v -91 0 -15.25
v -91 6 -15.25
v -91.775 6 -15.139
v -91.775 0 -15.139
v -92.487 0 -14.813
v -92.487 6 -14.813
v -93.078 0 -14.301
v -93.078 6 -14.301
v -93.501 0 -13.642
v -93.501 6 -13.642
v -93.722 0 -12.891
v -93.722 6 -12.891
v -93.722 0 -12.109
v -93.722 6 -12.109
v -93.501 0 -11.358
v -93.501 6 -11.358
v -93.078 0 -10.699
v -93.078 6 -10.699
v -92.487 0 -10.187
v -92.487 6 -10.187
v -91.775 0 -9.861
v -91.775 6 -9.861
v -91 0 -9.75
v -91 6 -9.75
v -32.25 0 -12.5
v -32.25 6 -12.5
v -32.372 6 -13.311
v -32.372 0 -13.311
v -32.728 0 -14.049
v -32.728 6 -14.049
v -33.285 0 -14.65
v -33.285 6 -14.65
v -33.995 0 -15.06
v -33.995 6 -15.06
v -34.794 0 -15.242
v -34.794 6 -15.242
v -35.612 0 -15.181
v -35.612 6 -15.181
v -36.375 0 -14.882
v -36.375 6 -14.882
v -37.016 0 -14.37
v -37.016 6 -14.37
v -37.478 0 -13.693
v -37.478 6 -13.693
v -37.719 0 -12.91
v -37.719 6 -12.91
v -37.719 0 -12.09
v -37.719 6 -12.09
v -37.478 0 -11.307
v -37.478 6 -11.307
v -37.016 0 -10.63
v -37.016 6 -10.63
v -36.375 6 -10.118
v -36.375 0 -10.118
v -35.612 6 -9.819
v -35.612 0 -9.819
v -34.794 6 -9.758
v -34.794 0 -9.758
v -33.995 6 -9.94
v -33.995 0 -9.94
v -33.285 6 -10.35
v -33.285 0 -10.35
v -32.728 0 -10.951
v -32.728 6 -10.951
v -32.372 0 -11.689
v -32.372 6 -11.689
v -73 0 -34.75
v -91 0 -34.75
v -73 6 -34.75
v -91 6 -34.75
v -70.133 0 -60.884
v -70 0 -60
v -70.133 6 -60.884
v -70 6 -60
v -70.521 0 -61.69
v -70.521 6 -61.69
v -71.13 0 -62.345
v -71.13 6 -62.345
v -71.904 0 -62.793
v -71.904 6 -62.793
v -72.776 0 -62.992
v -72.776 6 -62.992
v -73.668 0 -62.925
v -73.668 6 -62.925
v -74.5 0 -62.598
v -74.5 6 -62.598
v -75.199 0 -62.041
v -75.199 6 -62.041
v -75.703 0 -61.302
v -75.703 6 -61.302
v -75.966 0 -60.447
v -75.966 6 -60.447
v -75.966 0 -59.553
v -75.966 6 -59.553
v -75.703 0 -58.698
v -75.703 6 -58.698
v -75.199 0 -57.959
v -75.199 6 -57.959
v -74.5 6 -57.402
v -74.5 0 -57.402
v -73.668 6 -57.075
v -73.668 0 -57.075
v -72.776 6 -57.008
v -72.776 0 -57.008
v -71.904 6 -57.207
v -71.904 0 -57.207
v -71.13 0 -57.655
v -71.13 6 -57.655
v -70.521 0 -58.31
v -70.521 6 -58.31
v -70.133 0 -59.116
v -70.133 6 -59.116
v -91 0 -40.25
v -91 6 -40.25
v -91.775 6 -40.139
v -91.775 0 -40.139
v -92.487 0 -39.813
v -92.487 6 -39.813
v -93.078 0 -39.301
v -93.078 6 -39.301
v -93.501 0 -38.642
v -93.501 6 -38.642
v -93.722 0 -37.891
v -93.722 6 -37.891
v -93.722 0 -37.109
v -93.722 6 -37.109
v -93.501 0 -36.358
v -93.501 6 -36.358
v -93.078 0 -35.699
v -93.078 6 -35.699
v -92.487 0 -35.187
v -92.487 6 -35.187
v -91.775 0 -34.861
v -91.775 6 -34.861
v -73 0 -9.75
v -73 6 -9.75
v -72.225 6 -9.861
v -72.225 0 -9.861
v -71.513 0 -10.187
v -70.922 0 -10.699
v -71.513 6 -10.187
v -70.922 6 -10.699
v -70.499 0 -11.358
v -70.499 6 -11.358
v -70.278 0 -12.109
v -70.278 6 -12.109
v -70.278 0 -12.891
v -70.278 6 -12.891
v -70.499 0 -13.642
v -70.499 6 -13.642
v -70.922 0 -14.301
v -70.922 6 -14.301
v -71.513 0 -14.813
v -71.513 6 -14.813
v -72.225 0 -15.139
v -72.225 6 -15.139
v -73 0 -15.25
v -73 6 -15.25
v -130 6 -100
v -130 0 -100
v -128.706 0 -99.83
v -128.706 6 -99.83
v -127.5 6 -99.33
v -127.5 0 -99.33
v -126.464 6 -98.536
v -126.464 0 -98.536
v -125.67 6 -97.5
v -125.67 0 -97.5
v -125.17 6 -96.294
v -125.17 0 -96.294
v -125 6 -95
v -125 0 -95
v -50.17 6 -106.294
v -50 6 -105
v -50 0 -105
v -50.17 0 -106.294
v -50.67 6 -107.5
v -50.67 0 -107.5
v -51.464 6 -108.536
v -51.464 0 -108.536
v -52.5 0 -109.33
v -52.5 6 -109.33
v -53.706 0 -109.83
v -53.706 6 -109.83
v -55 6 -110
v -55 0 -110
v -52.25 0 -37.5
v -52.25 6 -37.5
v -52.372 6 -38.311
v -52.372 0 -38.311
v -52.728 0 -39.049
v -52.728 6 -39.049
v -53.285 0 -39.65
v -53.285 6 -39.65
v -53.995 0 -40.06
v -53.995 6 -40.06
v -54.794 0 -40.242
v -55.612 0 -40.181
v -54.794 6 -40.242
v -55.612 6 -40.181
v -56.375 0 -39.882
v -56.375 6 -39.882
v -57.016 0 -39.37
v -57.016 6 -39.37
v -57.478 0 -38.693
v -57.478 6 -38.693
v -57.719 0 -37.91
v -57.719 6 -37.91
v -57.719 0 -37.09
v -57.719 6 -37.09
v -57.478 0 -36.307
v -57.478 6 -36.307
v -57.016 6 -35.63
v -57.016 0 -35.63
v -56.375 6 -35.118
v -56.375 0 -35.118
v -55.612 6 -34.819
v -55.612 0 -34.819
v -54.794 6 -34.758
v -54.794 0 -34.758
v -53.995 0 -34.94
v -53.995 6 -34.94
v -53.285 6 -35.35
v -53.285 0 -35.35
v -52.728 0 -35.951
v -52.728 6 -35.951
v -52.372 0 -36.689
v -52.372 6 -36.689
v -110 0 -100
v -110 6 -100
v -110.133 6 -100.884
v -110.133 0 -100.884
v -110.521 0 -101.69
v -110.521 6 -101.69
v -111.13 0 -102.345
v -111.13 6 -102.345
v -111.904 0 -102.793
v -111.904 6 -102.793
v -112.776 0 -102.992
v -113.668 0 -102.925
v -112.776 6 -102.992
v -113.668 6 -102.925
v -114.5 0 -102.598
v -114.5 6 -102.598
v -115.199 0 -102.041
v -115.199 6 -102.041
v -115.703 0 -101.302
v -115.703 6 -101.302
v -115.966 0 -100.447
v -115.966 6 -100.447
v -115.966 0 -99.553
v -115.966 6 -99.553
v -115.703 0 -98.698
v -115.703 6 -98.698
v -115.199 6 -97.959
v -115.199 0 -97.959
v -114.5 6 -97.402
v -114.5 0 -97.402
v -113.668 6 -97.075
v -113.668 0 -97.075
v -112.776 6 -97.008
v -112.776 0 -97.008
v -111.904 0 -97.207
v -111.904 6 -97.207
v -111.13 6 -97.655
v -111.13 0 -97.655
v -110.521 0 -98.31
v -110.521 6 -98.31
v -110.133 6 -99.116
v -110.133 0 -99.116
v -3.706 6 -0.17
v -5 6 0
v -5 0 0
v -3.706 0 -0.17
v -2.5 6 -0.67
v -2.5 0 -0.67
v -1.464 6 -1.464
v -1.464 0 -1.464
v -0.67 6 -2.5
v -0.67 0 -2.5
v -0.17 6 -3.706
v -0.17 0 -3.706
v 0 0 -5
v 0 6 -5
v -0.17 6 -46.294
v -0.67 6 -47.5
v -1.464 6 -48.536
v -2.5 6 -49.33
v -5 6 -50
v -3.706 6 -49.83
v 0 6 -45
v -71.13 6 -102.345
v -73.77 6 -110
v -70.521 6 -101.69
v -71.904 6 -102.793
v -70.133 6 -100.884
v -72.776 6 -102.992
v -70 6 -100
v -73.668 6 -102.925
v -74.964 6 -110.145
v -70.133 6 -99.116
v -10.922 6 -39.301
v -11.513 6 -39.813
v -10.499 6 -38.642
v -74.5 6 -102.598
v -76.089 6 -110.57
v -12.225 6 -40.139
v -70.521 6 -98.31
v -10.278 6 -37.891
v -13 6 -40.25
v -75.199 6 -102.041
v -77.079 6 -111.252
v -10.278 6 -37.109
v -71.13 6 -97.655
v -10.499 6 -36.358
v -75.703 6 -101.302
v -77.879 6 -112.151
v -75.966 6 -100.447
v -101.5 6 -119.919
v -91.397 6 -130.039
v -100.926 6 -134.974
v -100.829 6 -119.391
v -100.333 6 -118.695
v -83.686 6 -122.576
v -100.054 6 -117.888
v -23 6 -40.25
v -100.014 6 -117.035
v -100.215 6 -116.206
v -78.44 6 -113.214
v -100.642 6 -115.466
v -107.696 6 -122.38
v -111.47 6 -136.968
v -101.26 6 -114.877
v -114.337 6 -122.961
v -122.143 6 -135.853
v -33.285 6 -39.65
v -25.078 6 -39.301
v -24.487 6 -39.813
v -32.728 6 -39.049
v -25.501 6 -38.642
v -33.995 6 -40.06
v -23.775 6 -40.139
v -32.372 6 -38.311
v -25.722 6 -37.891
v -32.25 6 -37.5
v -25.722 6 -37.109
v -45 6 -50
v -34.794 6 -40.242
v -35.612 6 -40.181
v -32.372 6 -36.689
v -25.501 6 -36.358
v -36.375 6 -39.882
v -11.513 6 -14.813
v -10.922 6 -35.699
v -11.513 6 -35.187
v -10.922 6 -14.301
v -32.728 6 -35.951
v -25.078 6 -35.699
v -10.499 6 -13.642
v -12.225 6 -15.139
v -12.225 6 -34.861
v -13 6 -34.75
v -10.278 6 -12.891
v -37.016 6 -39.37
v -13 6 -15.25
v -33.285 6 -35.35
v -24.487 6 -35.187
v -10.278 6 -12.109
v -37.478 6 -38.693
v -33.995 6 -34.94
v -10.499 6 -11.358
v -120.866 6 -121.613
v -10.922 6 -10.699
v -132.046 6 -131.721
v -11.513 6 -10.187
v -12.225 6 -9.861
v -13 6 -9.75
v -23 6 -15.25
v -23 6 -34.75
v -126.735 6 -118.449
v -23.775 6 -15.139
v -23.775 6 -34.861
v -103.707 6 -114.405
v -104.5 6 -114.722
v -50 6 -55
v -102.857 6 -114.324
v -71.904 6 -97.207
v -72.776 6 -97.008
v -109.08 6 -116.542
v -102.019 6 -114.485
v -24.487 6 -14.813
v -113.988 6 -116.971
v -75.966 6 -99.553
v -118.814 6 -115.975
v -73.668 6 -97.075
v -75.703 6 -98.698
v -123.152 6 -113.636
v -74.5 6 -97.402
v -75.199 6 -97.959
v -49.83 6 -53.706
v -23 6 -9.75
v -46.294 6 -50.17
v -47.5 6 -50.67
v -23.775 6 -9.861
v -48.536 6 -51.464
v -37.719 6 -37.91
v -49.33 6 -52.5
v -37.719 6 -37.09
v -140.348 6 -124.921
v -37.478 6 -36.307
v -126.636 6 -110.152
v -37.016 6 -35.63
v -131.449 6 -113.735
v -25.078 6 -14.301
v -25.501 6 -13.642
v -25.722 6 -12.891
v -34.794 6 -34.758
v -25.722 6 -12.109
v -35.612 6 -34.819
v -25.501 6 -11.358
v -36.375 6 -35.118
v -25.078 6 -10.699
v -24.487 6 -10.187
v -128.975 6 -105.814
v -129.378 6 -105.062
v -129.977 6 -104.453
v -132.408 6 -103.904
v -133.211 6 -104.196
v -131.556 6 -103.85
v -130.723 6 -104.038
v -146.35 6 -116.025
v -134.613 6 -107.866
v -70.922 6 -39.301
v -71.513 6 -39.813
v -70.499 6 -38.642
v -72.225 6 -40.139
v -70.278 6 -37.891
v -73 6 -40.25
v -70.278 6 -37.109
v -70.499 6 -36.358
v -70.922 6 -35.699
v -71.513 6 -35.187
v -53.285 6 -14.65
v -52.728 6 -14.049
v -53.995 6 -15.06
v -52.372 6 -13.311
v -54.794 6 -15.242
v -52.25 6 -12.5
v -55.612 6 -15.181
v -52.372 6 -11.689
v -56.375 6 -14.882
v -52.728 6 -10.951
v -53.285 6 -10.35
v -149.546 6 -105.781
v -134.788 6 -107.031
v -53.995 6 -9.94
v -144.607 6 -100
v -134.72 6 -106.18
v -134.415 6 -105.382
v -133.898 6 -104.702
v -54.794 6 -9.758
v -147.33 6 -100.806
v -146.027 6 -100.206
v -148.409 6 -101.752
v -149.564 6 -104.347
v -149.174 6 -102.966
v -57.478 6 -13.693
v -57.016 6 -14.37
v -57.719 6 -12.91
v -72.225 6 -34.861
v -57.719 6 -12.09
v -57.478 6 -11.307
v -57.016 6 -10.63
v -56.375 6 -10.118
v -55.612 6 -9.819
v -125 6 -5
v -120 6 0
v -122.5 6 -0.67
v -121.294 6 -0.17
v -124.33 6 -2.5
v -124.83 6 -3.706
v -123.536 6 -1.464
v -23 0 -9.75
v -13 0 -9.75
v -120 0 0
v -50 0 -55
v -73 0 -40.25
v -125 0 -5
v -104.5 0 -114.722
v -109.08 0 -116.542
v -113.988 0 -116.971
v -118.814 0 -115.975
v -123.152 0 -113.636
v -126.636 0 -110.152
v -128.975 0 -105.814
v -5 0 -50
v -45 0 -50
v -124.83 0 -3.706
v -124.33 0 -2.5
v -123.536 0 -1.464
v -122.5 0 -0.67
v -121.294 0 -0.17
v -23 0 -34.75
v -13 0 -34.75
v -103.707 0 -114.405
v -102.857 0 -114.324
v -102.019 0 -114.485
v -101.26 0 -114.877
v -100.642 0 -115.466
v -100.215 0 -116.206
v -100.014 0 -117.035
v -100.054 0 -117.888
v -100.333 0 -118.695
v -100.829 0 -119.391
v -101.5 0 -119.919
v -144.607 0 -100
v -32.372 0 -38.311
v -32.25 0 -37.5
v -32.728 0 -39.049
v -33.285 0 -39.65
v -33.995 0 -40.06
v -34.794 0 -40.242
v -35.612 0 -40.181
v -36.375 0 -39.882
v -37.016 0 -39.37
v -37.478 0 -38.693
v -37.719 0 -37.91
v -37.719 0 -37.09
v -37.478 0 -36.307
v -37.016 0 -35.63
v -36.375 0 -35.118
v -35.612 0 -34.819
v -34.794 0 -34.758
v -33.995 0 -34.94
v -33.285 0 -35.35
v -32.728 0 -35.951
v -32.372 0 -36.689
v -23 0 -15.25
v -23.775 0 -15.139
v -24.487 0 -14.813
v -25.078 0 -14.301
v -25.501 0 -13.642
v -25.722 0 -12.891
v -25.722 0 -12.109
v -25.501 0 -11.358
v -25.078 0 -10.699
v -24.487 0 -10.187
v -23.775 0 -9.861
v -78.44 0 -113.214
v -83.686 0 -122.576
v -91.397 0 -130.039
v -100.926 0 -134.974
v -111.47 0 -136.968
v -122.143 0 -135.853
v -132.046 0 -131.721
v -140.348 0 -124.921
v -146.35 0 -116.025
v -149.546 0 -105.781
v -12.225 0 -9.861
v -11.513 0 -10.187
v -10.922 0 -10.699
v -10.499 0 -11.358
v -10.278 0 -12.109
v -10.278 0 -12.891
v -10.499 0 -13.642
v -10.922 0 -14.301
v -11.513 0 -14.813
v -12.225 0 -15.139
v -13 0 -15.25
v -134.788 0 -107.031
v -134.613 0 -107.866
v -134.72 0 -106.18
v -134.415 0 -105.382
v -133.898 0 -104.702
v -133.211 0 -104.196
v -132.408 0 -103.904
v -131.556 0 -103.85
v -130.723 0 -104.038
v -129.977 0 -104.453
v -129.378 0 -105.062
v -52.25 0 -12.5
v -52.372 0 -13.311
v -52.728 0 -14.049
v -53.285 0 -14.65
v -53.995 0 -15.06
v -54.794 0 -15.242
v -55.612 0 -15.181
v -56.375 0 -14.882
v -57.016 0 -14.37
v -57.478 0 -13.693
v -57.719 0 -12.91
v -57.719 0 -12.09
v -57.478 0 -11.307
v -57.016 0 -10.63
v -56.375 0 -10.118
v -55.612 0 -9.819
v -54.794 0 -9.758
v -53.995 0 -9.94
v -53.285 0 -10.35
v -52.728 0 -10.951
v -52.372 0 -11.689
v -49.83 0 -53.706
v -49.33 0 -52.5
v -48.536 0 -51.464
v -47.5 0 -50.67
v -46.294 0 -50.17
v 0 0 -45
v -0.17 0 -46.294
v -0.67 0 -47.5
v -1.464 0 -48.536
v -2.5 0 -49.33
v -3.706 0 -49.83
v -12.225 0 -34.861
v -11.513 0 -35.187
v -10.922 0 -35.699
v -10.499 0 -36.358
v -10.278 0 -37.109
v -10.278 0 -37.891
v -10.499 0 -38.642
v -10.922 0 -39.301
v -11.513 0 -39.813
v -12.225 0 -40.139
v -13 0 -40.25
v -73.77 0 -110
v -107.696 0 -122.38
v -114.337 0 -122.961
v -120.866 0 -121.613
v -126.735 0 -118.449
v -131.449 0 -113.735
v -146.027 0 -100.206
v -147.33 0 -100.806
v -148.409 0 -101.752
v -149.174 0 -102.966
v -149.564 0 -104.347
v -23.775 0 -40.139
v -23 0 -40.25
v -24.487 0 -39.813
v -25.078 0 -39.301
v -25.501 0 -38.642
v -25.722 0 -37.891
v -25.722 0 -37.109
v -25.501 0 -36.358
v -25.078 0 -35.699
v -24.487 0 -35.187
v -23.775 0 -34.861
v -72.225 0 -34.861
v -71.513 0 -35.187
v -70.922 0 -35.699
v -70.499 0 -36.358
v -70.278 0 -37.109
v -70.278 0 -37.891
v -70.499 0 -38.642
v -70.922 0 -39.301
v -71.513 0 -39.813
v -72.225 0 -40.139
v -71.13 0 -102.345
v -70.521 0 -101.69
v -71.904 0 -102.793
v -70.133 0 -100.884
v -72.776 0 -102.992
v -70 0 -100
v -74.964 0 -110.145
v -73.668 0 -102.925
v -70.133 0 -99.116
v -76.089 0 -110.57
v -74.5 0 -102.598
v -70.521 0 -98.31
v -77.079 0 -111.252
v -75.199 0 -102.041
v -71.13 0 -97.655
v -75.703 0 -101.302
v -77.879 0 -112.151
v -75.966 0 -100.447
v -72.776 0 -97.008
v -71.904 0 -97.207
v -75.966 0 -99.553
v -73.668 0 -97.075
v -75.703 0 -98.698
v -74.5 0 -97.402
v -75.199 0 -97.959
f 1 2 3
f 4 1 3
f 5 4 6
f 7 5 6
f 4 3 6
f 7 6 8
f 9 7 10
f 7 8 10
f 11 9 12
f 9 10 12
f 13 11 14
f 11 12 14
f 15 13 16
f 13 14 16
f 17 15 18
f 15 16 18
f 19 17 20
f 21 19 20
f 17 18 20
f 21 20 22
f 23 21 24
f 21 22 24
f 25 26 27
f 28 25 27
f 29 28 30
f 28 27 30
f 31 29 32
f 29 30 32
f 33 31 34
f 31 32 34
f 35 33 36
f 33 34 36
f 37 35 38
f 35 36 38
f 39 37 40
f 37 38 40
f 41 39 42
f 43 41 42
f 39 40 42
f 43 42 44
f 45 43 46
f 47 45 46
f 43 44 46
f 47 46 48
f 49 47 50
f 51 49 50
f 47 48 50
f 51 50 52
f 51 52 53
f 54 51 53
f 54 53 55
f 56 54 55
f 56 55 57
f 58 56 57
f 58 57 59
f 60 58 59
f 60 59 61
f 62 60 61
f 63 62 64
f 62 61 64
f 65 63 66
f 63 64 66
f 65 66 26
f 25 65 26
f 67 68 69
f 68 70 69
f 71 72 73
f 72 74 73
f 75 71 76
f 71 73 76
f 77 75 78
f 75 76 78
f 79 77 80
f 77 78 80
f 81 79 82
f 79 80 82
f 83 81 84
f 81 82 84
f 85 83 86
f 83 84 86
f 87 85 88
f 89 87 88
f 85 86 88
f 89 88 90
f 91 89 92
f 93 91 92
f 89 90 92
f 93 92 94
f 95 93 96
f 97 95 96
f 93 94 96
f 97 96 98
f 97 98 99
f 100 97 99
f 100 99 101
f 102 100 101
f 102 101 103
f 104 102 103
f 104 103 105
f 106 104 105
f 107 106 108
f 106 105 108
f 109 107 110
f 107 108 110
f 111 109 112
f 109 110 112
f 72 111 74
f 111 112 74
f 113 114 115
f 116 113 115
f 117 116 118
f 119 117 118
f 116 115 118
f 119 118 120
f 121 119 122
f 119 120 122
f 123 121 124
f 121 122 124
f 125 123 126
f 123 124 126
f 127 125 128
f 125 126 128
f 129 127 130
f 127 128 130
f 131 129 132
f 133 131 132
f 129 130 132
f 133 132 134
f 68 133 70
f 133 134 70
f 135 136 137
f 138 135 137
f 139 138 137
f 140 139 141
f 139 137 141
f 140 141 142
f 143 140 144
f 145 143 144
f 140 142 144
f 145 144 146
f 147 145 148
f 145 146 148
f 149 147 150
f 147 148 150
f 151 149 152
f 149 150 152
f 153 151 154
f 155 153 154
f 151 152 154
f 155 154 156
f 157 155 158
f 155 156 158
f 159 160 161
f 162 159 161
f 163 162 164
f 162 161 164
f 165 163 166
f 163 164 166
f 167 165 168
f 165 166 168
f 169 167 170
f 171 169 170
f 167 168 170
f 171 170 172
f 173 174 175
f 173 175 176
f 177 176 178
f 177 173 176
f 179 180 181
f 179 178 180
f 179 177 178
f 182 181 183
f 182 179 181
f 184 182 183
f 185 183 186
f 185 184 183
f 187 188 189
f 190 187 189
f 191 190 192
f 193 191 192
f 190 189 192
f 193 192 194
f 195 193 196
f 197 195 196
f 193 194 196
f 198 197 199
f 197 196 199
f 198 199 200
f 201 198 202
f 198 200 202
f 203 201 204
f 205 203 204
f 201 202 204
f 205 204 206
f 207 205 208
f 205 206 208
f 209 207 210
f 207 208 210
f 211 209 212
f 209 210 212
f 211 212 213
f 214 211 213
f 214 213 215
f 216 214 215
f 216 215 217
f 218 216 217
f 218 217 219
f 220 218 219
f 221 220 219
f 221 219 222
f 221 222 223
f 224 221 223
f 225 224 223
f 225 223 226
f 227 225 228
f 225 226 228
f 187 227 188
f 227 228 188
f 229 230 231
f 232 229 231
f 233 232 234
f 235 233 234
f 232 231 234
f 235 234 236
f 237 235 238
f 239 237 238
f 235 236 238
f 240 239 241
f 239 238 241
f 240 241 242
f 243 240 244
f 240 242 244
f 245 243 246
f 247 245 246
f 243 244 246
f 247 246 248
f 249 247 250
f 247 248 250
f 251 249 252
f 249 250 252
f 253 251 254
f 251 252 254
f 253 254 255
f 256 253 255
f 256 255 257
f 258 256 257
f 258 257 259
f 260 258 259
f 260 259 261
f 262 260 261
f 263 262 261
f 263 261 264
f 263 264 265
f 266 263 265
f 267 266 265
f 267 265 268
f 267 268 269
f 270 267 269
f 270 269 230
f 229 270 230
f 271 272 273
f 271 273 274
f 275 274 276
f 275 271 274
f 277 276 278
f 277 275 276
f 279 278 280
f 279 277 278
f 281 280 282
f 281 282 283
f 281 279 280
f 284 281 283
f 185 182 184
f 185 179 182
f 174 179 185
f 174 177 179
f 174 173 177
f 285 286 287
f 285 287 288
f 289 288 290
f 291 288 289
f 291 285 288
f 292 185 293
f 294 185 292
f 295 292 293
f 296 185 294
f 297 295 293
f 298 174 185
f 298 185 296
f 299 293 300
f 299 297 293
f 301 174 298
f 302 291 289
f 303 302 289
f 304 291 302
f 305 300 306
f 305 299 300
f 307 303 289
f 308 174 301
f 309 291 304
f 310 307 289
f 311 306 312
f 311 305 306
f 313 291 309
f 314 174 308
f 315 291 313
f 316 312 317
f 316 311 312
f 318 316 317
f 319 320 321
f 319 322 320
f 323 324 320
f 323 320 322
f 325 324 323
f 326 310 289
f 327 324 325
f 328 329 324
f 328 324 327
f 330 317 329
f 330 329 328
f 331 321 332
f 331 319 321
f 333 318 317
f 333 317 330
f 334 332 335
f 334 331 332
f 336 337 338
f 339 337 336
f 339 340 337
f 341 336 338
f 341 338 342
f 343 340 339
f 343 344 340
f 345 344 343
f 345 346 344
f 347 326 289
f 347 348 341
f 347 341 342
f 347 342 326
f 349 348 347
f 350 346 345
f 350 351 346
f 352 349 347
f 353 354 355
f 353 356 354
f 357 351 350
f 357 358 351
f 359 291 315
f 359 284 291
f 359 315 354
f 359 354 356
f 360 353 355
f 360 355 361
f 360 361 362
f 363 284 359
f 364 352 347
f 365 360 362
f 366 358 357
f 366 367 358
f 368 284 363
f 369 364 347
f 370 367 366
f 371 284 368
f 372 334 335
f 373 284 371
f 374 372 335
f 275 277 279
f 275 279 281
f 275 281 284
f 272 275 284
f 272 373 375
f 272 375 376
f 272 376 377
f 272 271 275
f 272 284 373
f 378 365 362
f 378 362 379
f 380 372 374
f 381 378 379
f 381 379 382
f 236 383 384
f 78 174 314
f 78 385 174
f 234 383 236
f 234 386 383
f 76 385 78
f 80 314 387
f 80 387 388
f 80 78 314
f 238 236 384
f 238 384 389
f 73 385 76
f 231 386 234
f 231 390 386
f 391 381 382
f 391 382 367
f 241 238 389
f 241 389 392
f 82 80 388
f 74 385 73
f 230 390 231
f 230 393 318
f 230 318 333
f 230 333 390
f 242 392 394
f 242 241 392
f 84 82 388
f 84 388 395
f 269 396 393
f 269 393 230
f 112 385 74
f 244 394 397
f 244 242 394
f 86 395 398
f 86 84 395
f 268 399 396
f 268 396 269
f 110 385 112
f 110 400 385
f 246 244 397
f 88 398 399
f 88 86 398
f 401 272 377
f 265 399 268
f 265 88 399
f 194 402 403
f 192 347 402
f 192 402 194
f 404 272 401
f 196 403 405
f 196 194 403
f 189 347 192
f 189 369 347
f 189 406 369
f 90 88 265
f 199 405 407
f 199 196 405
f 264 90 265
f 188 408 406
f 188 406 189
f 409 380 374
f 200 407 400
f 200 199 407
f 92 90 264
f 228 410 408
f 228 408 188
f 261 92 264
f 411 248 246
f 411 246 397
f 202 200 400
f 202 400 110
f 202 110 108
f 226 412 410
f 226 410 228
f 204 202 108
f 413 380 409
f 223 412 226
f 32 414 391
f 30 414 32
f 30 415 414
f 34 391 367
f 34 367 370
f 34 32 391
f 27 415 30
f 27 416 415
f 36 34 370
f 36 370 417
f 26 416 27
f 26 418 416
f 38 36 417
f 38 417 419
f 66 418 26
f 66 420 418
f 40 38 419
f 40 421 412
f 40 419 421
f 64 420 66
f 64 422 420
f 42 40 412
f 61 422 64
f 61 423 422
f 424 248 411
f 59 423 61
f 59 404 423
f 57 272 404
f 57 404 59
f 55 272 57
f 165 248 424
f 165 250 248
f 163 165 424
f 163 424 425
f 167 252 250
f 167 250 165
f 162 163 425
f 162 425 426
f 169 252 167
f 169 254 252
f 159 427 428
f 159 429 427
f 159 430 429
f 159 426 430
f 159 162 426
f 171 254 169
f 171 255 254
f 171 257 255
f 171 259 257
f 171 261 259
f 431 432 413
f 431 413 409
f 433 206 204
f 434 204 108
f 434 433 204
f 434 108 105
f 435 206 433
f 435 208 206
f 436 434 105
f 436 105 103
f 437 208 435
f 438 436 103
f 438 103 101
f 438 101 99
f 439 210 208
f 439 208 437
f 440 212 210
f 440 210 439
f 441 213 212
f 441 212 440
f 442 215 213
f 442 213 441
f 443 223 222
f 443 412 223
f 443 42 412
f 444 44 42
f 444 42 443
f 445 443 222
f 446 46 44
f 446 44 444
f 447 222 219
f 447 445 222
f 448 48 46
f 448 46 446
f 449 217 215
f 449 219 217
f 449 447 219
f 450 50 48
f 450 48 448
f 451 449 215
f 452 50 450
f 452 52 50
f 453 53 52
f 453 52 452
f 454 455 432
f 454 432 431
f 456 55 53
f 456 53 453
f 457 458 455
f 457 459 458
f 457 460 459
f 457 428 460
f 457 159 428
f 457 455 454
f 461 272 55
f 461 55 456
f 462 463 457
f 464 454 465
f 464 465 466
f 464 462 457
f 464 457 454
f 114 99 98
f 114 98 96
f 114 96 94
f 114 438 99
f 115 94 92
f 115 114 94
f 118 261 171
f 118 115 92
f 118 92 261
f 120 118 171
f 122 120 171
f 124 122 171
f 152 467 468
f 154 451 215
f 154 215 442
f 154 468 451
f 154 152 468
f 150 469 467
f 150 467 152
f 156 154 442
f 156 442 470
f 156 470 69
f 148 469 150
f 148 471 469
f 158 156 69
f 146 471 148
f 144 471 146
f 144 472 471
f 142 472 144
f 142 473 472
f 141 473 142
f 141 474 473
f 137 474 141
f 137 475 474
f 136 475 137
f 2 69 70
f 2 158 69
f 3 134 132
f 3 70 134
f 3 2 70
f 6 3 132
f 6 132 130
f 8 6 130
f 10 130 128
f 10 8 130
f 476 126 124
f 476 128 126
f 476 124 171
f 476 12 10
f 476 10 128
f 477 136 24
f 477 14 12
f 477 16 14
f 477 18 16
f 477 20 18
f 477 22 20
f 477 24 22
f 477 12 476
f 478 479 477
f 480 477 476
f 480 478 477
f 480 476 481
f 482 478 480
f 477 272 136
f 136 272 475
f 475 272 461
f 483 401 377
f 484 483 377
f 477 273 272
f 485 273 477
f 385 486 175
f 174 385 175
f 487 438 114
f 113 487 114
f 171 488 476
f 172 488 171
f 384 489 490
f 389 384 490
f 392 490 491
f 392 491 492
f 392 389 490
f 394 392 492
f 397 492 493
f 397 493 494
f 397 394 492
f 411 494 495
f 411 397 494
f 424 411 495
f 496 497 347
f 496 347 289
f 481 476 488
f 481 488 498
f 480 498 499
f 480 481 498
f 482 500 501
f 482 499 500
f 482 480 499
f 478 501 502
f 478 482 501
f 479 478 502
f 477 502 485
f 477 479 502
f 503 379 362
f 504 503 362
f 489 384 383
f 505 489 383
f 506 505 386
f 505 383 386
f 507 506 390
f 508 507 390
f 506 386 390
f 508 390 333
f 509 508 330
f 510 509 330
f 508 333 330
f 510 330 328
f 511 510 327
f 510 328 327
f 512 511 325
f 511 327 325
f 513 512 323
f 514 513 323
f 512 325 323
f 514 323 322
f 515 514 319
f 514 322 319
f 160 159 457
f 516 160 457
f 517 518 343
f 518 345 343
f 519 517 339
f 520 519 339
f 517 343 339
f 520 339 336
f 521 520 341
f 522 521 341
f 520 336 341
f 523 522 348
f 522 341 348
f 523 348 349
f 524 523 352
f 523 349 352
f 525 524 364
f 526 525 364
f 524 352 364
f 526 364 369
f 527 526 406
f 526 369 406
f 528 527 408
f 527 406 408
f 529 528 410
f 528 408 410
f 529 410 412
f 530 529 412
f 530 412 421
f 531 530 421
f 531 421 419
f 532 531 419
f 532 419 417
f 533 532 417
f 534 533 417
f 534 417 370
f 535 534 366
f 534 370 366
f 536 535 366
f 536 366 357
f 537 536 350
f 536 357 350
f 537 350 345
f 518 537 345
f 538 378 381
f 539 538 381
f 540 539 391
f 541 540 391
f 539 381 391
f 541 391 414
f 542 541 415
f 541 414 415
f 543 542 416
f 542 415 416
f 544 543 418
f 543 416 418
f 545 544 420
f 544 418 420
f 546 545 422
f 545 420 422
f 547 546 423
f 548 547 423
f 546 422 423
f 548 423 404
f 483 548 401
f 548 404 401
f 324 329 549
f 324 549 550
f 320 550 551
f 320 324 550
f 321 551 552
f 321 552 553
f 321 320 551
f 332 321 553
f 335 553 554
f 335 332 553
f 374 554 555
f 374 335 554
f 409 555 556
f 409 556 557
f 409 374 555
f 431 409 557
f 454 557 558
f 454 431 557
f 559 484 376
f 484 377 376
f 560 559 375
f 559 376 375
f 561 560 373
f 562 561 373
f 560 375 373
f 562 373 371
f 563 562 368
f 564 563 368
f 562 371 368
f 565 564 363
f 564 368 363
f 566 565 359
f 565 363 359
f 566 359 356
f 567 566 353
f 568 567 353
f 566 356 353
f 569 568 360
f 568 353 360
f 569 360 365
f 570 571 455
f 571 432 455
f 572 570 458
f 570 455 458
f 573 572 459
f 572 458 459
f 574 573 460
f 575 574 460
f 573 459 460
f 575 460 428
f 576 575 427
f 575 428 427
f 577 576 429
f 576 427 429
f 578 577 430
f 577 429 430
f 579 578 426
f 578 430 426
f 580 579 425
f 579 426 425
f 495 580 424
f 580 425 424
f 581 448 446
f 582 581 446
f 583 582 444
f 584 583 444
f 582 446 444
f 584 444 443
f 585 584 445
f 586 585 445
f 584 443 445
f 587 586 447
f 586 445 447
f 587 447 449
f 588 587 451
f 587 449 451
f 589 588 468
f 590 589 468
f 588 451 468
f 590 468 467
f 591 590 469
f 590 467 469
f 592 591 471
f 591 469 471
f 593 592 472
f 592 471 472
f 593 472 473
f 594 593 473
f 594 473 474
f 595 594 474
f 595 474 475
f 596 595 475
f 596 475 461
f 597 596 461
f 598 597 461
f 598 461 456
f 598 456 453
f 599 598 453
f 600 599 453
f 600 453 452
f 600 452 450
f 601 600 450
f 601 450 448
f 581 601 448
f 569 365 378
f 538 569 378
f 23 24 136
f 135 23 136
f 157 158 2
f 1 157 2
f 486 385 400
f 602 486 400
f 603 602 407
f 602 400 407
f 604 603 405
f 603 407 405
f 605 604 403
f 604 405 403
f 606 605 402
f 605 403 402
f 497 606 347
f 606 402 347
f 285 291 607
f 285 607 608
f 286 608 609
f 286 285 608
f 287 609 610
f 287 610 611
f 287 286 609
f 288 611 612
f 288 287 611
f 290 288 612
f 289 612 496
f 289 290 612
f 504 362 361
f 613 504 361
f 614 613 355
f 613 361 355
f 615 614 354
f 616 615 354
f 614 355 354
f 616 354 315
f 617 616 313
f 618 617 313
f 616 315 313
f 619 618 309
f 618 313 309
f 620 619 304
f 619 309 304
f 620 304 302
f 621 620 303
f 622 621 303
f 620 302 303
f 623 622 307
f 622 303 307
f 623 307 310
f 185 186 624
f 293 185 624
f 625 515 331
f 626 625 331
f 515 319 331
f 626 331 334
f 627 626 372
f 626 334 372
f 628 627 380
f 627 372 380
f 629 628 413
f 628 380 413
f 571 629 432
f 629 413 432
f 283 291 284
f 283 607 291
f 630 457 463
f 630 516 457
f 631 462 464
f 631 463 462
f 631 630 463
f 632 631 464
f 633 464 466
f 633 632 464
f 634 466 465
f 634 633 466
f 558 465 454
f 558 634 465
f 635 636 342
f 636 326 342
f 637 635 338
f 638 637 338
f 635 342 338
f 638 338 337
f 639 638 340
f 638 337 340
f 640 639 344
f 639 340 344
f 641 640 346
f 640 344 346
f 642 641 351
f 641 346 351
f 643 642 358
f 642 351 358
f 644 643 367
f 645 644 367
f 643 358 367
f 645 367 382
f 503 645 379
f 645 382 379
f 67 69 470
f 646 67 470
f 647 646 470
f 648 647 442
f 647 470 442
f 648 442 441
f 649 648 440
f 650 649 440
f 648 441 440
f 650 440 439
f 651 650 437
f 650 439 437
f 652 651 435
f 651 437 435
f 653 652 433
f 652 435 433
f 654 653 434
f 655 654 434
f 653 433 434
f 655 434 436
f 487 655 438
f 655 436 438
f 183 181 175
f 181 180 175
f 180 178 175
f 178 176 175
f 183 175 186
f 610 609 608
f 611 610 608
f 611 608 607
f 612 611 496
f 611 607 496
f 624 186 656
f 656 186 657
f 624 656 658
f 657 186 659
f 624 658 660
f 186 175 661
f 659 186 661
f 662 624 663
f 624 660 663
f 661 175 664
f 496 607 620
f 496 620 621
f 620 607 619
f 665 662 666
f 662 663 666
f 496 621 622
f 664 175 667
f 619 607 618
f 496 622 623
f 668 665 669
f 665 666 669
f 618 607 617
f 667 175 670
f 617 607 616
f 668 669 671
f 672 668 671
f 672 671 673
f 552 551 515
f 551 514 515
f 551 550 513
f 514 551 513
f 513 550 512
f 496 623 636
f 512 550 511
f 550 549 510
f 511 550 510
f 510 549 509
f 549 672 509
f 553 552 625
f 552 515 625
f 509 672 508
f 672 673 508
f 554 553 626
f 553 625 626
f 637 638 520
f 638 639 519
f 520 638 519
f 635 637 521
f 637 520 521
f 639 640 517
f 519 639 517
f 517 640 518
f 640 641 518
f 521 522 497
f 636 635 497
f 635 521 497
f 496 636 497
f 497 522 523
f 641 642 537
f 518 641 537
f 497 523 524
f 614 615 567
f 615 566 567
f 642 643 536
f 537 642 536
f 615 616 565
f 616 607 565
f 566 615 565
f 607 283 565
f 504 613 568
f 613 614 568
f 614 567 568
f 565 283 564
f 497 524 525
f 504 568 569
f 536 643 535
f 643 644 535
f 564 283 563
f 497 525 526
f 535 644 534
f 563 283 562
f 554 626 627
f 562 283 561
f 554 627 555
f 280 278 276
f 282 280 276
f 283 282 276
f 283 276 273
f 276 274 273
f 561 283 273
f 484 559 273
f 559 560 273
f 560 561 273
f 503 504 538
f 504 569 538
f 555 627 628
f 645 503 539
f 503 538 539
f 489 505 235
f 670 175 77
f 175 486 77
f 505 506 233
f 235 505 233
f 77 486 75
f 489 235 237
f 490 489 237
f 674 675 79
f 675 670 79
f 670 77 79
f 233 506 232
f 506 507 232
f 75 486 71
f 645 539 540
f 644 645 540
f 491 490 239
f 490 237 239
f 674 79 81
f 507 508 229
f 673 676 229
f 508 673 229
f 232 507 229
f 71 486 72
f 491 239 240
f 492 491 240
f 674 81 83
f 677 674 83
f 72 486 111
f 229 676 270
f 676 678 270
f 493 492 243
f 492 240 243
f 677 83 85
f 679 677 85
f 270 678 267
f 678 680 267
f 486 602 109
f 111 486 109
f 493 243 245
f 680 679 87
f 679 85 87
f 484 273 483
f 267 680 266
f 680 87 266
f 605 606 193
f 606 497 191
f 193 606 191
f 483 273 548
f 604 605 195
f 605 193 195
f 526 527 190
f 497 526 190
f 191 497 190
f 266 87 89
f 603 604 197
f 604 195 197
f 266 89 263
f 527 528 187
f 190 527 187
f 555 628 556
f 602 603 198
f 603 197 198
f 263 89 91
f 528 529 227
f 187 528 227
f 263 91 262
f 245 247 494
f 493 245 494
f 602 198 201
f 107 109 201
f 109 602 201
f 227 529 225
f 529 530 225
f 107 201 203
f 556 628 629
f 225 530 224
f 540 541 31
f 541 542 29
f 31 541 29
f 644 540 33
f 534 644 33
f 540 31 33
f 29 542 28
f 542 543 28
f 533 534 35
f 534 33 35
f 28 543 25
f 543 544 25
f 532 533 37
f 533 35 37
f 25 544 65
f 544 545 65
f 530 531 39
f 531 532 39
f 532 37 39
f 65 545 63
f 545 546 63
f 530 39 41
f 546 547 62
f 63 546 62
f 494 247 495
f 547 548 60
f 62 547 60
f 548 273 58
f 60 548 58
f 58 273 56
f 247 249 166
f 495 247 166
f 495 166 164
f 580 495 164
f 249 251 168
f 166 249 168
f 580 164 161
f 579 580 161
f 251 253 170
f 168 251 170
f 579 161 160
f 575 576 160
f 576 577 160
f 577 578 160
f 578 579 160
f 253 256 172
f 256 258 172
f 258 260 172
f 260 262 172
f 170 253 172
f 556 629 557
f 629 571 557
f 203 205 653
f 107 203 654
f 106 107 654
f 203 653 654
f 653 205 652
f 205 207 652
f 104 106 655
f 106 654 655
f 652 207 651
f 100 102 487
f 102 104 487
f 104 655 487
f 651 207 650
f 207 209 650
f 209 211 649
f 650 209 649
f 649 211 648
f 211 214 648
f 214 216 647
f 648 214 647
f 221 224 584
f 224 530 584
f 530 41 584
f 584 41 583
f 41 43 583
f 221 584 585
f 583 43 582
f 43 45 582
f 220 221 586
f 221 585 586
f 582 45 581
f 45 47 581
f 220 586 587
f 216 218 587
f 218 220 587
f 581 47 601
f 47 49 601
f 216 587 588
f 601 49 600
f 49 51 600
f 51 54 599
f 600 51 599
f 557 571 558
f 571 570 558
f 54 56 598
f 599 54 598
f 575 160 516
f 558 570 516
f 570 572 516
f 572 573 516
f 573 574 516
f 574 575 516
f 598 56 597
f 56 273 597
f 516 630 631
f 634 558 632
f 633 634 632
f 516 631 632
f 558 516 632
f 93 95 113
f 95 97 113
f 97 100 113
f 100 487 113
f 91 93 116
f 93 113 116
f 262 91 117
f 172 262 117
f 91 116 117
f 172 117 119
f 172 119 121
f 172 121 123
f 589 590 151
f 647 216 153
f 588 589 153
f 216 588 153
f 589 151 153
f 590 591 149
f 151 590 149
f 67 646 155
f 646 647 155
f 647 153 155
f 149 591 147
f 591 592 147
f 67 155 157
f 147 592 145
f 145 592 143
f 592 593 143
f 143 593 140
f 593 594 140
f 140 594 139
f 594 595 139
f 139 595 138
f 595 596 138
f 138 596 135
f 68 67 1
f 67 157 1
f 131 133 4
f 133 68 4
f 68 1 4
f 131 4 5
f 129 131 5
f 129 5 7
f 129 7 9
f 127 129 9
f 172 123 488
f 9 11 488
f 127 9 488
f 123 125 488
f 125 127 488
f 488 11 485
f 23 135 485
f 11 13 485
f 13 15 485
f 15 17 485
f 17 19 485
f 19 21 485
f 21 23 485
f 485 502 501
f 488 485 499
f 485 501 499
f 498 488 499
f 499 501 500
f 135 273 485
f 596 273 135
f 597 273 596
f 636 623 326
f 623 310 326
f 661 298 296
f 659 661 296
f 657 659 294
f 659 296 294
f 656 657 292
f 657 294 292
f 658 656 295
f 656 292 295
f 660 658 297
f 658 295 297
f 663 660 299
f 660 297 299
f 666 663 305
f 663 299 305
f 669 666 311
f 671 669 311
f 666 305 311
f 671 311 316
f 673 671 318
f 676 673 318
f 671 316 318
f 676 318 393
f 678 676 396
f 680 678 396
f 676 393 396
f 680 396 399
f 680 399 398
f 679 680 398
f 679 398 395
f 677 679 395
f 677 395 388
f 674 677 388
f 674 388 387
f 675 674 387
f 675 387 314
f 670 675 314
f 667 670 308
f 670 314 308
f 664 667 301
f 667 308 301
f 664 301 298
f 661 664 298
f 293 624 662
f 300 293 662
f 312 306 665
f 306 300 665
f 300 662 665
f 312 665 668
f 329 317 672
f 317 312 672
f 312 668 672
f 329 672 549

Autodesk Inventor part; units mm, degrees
ref_plane "YZ Plane" through (0, 0, 0) normal (1, 0, 0) x (0, 1, 0)
ref_plane "XZ Plane" through (0, 0, 0) normal (0, 1, 0) x (-1, 0, 0)
ref_plane "XY Plane" through (0, 0, 0) normal (0, 0, 1) x (1, 0, 0)
sketch "Sketch1" plane through (0, 0, 0) normal (0, 1, 0) x (-1, 0, 0)
  line L0 (0, 0) -> (125, 0)
  line L1 (125, 0) -> (125, -50)
  line L2 (125, -50) -> (0, -50)
  line L3 (0, -50) -> (0, 0)
  line L4 (0, 0) -> (0, -16.6667)
  line L5 (0, -16.6667) -> (6, -16.6667)
  line L6 (125, -50) -> (50, -50)
  line L7 (50, -50) -> (50, -110)
  line L8 (50, -110) -> (125, -110)
  line L9 (125, -110) -> (125, -50)
  point P0 (50, -50)
  dimension "d0" = 125
  dimension "d1" = 50
  dimension "d2" = 16.6667
  dimension "d3" = 6
  dimension "d90" = 75
  dimension "d91" = 60
extrude "Extrusion1" add sketch "Sketch1" along normal blind 6
sketch "Sketch3" plane through (0, 6, 0) normal (0, 1, 0) x (1, 0, 0)
  circle A0 centre (-13, 12.5) radius 2.75
  line L0 (0, 0) -> (0, 50) projected
  line L1 (-125, 0) -> (0, 0) projected
  circle A1 centre (-13, 37.5) radius 2.75
  line L2 (-13, 12.5) -> (-18, 12.5)
  line L3 (-23, 12.5) -> (-13, 12.5) construction
  line L4 (-23, 9.75) -> (-13, 9.75)
  line L5 (-13, 15.25) -> (-23, 15.25)
  arc A2 (-23, 15.25) -> (-23, 9.75) centre (-23, 12.5) ccw
  arc A3 (-13, 9.75) -> (-13, 15.25) centre (-13, 12.5) ccw
  line L6 (-13, 37.5) -> (-18, 37.5)
  line L7 (-13, 37.5) -> (-8, 37.5) construction
  line L8 (-23, 37.5) -> (-13, 37.5) construction
  line L9 (-23, 34.75) -> (-13, 34.75)
  line L10 (-13, 40.25) -> (-23, 40.25)
  arc A4 (-23, 40.25) -> (-23, 34.75) centre (-23, 37.5) ccw
  arc A5 (-13, 34.75) -> (-13, 40.25) centre (-13, 37.5) ccw
  dimension "d21" = 5.5
  dimension "d22" = 13
  dimension "d23" = 12.5
  dimension "d26" = 25
  dimension "d87" = 5
  dimension "d88" = 5
  dimension "d89" = 180
extrude "Extrusion3" cut sketch "Sketch3" against normal through all
sketch "Sketch4" plane through (0, 6, 0) normal (0, 1, 0) x (1, 0, 0)
  arc A0 (-13, 9.75) -> (-13, 15.25) centre (-13, 12.5) ccw projected
  line L0 (-13, 12.5) -> (-73, 12.5)
  line L1 (-73, 12.5) -> (-91, 12.5) construction
  line L2 (-73, 15.25) -> (-91, 15.25)
  line L3 (-91, 9.75) -> (-73, 9.75)
  arc A1 (-73, 9.75) -> (-73, 15.25) centre (-73, 12.5) ccw
  arc A2 (-91, 15.25) -> (-91, 9.75) centre (-91, 12.5) ccw
  point P0 (0, 0)
  point P1 (-82, 12.5)
  dimension "d33" = 60
  dimension "d34" = 18
  dimension "d35" = 5.5
extrude "Extrusion4" cut sketch "Sketch4" against normal through all
pattern_linear "Rectangular Pattern2" count 2 spacing 25 along (0, 0, -1) of "Extrusion4"
sketch "Sketch5" plane through (0, 0, -50) normal (0, 0, -1) x (-1, 0, 0)
  line L0 (125, 0) -> (125, 6) projected
  line L1 (125, 0) -> (0, 0) projected
  line L2 (125, 6) -> (100, 6)
  line L3 (100, 6) -> (100, 0)
  line L4 (100, 0) -> (125, 0)
  line L5 (125, 0) -> (125, 6)
  dimension "d45" = 25
fillet "Fillet2" radius 5 3 edges at (-125, 3, 0) (0, 3, 0) (0, 3, -50)
sketch "Sketch7" plane through (0, 6, 0) normal (0, 1, 0) x (1, 0, 0)
  arc A0 (-13, 9.75) -> (-13, 15.25) centre (-13, 12.5) ccw projected
  line L0 (-13, 12.5) -> (-35, 12.5)
  line L1 (-35, 12.5) -> (-55, 12.5)
  circle A1 centre (-55, 12.5) radius 2.75
  circle A2 centre (-35, 12.5) radius 2.75
  line L2 (0, 5) -> (0, 45) projected
  line L3 (0, 0) -> (0, 45)
  circle A3 centre (-35, 37.5) radius 2.75
  circle A4 centre (-55, 37.5) radius 2.75
  dimension "d55" = 22
  dimension "d56" = 20
  dimension "d57" = 5.5
  dimension "d58" = 5.5
  dimension "d61" = 25
extrude "Extrusion7" cut sketch "Sketch7" against normal through all
sketch "Sketch9" plane through (0, 6, 0) normal (0, 1, 0) x (1, 0, 0)
  point P0 (0, 0)
sketch "Sketch12" plane through (0, 6, 0) normal (0, 1, 0) x (1, 0, 0)
  line L0 (-50, 110) -> (-125, 110) projected
  circle A0 centre (-73, 100) radius 3
  line L1 (-73, 100) -> (-73, 60)
  circle A1 centre (-73, 60) radius 3
  line L2 (-125, 110) -> (-125, 5) projected
  line L3 (-50, 50) -> (-50, 110) projected
  arc A2 (-73, 34.75) -> (-73, 40.25) centre (-73, 37.5) ccw projected
  line L4 (-73, 100) -> (-113, 100)
  circle A3 centre (-113, 100) radius 3
  point P0 (0, 0)
  dimension "d93" = 6
  dimension "d94" = 40
  dimension "d96" = 6
  dimension "d102" = 0
  dimension "d103" = 10
  dimension "d104" = 40
  dimension "d105" = 6
extrude "Extrusion10" cut sketch "Sketch12" against normal through all
fillet "Fillet3" radius 5 2 edges at (-125, 3, -110) (-50, 3, -110)
fillet "Fillet4" radius 5 1 edges at (-50, 3, -50)
sketch "Sketch13" plane through (0, 6, 0) normal (0, 1, 0) x (1, 0, 0)
  circle A0 centre (-113, 100) radius 3 projected
  circle A1 centre (-113, 100) radius 20
  circle A2 centre (-113, 100) radius 37
  circle A3 centre (-73, 100) radius 3 projected
  line L0 (-113, 100) -> (-133, 100)
  line L1 (-133, 100) -> (-150, 100)
  line L2 (-133, 100) -> (-116, 100) construction
  line L3 (-113, 100) -> (-77.377, 110)
  line L4 (-55, 110) -> (-120, 110) projected
  line L5 (-113, 100) -> (-93.7443, 105.4054)
  point P0 (0, 0)
  point P1 (-95.6795, 110)
  point P2 (-110.1116, 100.8108)
  dimension "d108" = 40
  dimension "d109" = 17
  dimension "d110" = 180
extrude "Extrusion11" add sketch "Sketch13" against normal blind 6 contours A0 L0 A1 L3 | L1 A2 L4 A1 picked at (-127.1454, 101.5717)
sketch "Sketch14" plane through (0, 6, 0) normal (0, 1, 0) x (1, 0, 0)
  circle A0 centre (-113, 100) radius 3 projected
  arc A1 (-103, 117.3205) -> (-131.7939, 106.8404) centre (-113, 100) ccw construction
  arc A2 (-101.5, 119.9186) -> (-134.6129, 107.8665) centre (-113, 100) ccw
  arc A3 (-104.5, 114.7224) -> (-128.9748, 105.8143) centre (-113, 100) ccw
  arc A4 (-104.5, 114.7224) -> (-101.5, 119.9186) centre (-103, 117.3205) ccw
  arc A5 (-134.6129, 107.8665) -> (-128.9748, 105.8143) centre (-131.7939, 106.8404) ccw
  line L0 (-113, 100) -> (-131.7939, 106.8404) construction
  line L1 (-113, 100) -> (-93, 100) construction
  line L2 (-113, 100) -> (-103, 117.3205) construction
  point P0 (0, 0)
  dimension "d113" = 20
  dimension "d114" = 160
  dimension "d115" = 100
  dimension "d116" = 6
extrude "Extrusion12" cut sketch "Sketch14" against normal through all contours A4 A3 A5 A2
fillet "Fillet5" radius 5 2 edges at (-150, 3, -100) (-125, 3, -100)
fillet "Fillet6" radius 5 1 edges at (-77.377, 3, -110)
properties part number "CableChain_Plate"
